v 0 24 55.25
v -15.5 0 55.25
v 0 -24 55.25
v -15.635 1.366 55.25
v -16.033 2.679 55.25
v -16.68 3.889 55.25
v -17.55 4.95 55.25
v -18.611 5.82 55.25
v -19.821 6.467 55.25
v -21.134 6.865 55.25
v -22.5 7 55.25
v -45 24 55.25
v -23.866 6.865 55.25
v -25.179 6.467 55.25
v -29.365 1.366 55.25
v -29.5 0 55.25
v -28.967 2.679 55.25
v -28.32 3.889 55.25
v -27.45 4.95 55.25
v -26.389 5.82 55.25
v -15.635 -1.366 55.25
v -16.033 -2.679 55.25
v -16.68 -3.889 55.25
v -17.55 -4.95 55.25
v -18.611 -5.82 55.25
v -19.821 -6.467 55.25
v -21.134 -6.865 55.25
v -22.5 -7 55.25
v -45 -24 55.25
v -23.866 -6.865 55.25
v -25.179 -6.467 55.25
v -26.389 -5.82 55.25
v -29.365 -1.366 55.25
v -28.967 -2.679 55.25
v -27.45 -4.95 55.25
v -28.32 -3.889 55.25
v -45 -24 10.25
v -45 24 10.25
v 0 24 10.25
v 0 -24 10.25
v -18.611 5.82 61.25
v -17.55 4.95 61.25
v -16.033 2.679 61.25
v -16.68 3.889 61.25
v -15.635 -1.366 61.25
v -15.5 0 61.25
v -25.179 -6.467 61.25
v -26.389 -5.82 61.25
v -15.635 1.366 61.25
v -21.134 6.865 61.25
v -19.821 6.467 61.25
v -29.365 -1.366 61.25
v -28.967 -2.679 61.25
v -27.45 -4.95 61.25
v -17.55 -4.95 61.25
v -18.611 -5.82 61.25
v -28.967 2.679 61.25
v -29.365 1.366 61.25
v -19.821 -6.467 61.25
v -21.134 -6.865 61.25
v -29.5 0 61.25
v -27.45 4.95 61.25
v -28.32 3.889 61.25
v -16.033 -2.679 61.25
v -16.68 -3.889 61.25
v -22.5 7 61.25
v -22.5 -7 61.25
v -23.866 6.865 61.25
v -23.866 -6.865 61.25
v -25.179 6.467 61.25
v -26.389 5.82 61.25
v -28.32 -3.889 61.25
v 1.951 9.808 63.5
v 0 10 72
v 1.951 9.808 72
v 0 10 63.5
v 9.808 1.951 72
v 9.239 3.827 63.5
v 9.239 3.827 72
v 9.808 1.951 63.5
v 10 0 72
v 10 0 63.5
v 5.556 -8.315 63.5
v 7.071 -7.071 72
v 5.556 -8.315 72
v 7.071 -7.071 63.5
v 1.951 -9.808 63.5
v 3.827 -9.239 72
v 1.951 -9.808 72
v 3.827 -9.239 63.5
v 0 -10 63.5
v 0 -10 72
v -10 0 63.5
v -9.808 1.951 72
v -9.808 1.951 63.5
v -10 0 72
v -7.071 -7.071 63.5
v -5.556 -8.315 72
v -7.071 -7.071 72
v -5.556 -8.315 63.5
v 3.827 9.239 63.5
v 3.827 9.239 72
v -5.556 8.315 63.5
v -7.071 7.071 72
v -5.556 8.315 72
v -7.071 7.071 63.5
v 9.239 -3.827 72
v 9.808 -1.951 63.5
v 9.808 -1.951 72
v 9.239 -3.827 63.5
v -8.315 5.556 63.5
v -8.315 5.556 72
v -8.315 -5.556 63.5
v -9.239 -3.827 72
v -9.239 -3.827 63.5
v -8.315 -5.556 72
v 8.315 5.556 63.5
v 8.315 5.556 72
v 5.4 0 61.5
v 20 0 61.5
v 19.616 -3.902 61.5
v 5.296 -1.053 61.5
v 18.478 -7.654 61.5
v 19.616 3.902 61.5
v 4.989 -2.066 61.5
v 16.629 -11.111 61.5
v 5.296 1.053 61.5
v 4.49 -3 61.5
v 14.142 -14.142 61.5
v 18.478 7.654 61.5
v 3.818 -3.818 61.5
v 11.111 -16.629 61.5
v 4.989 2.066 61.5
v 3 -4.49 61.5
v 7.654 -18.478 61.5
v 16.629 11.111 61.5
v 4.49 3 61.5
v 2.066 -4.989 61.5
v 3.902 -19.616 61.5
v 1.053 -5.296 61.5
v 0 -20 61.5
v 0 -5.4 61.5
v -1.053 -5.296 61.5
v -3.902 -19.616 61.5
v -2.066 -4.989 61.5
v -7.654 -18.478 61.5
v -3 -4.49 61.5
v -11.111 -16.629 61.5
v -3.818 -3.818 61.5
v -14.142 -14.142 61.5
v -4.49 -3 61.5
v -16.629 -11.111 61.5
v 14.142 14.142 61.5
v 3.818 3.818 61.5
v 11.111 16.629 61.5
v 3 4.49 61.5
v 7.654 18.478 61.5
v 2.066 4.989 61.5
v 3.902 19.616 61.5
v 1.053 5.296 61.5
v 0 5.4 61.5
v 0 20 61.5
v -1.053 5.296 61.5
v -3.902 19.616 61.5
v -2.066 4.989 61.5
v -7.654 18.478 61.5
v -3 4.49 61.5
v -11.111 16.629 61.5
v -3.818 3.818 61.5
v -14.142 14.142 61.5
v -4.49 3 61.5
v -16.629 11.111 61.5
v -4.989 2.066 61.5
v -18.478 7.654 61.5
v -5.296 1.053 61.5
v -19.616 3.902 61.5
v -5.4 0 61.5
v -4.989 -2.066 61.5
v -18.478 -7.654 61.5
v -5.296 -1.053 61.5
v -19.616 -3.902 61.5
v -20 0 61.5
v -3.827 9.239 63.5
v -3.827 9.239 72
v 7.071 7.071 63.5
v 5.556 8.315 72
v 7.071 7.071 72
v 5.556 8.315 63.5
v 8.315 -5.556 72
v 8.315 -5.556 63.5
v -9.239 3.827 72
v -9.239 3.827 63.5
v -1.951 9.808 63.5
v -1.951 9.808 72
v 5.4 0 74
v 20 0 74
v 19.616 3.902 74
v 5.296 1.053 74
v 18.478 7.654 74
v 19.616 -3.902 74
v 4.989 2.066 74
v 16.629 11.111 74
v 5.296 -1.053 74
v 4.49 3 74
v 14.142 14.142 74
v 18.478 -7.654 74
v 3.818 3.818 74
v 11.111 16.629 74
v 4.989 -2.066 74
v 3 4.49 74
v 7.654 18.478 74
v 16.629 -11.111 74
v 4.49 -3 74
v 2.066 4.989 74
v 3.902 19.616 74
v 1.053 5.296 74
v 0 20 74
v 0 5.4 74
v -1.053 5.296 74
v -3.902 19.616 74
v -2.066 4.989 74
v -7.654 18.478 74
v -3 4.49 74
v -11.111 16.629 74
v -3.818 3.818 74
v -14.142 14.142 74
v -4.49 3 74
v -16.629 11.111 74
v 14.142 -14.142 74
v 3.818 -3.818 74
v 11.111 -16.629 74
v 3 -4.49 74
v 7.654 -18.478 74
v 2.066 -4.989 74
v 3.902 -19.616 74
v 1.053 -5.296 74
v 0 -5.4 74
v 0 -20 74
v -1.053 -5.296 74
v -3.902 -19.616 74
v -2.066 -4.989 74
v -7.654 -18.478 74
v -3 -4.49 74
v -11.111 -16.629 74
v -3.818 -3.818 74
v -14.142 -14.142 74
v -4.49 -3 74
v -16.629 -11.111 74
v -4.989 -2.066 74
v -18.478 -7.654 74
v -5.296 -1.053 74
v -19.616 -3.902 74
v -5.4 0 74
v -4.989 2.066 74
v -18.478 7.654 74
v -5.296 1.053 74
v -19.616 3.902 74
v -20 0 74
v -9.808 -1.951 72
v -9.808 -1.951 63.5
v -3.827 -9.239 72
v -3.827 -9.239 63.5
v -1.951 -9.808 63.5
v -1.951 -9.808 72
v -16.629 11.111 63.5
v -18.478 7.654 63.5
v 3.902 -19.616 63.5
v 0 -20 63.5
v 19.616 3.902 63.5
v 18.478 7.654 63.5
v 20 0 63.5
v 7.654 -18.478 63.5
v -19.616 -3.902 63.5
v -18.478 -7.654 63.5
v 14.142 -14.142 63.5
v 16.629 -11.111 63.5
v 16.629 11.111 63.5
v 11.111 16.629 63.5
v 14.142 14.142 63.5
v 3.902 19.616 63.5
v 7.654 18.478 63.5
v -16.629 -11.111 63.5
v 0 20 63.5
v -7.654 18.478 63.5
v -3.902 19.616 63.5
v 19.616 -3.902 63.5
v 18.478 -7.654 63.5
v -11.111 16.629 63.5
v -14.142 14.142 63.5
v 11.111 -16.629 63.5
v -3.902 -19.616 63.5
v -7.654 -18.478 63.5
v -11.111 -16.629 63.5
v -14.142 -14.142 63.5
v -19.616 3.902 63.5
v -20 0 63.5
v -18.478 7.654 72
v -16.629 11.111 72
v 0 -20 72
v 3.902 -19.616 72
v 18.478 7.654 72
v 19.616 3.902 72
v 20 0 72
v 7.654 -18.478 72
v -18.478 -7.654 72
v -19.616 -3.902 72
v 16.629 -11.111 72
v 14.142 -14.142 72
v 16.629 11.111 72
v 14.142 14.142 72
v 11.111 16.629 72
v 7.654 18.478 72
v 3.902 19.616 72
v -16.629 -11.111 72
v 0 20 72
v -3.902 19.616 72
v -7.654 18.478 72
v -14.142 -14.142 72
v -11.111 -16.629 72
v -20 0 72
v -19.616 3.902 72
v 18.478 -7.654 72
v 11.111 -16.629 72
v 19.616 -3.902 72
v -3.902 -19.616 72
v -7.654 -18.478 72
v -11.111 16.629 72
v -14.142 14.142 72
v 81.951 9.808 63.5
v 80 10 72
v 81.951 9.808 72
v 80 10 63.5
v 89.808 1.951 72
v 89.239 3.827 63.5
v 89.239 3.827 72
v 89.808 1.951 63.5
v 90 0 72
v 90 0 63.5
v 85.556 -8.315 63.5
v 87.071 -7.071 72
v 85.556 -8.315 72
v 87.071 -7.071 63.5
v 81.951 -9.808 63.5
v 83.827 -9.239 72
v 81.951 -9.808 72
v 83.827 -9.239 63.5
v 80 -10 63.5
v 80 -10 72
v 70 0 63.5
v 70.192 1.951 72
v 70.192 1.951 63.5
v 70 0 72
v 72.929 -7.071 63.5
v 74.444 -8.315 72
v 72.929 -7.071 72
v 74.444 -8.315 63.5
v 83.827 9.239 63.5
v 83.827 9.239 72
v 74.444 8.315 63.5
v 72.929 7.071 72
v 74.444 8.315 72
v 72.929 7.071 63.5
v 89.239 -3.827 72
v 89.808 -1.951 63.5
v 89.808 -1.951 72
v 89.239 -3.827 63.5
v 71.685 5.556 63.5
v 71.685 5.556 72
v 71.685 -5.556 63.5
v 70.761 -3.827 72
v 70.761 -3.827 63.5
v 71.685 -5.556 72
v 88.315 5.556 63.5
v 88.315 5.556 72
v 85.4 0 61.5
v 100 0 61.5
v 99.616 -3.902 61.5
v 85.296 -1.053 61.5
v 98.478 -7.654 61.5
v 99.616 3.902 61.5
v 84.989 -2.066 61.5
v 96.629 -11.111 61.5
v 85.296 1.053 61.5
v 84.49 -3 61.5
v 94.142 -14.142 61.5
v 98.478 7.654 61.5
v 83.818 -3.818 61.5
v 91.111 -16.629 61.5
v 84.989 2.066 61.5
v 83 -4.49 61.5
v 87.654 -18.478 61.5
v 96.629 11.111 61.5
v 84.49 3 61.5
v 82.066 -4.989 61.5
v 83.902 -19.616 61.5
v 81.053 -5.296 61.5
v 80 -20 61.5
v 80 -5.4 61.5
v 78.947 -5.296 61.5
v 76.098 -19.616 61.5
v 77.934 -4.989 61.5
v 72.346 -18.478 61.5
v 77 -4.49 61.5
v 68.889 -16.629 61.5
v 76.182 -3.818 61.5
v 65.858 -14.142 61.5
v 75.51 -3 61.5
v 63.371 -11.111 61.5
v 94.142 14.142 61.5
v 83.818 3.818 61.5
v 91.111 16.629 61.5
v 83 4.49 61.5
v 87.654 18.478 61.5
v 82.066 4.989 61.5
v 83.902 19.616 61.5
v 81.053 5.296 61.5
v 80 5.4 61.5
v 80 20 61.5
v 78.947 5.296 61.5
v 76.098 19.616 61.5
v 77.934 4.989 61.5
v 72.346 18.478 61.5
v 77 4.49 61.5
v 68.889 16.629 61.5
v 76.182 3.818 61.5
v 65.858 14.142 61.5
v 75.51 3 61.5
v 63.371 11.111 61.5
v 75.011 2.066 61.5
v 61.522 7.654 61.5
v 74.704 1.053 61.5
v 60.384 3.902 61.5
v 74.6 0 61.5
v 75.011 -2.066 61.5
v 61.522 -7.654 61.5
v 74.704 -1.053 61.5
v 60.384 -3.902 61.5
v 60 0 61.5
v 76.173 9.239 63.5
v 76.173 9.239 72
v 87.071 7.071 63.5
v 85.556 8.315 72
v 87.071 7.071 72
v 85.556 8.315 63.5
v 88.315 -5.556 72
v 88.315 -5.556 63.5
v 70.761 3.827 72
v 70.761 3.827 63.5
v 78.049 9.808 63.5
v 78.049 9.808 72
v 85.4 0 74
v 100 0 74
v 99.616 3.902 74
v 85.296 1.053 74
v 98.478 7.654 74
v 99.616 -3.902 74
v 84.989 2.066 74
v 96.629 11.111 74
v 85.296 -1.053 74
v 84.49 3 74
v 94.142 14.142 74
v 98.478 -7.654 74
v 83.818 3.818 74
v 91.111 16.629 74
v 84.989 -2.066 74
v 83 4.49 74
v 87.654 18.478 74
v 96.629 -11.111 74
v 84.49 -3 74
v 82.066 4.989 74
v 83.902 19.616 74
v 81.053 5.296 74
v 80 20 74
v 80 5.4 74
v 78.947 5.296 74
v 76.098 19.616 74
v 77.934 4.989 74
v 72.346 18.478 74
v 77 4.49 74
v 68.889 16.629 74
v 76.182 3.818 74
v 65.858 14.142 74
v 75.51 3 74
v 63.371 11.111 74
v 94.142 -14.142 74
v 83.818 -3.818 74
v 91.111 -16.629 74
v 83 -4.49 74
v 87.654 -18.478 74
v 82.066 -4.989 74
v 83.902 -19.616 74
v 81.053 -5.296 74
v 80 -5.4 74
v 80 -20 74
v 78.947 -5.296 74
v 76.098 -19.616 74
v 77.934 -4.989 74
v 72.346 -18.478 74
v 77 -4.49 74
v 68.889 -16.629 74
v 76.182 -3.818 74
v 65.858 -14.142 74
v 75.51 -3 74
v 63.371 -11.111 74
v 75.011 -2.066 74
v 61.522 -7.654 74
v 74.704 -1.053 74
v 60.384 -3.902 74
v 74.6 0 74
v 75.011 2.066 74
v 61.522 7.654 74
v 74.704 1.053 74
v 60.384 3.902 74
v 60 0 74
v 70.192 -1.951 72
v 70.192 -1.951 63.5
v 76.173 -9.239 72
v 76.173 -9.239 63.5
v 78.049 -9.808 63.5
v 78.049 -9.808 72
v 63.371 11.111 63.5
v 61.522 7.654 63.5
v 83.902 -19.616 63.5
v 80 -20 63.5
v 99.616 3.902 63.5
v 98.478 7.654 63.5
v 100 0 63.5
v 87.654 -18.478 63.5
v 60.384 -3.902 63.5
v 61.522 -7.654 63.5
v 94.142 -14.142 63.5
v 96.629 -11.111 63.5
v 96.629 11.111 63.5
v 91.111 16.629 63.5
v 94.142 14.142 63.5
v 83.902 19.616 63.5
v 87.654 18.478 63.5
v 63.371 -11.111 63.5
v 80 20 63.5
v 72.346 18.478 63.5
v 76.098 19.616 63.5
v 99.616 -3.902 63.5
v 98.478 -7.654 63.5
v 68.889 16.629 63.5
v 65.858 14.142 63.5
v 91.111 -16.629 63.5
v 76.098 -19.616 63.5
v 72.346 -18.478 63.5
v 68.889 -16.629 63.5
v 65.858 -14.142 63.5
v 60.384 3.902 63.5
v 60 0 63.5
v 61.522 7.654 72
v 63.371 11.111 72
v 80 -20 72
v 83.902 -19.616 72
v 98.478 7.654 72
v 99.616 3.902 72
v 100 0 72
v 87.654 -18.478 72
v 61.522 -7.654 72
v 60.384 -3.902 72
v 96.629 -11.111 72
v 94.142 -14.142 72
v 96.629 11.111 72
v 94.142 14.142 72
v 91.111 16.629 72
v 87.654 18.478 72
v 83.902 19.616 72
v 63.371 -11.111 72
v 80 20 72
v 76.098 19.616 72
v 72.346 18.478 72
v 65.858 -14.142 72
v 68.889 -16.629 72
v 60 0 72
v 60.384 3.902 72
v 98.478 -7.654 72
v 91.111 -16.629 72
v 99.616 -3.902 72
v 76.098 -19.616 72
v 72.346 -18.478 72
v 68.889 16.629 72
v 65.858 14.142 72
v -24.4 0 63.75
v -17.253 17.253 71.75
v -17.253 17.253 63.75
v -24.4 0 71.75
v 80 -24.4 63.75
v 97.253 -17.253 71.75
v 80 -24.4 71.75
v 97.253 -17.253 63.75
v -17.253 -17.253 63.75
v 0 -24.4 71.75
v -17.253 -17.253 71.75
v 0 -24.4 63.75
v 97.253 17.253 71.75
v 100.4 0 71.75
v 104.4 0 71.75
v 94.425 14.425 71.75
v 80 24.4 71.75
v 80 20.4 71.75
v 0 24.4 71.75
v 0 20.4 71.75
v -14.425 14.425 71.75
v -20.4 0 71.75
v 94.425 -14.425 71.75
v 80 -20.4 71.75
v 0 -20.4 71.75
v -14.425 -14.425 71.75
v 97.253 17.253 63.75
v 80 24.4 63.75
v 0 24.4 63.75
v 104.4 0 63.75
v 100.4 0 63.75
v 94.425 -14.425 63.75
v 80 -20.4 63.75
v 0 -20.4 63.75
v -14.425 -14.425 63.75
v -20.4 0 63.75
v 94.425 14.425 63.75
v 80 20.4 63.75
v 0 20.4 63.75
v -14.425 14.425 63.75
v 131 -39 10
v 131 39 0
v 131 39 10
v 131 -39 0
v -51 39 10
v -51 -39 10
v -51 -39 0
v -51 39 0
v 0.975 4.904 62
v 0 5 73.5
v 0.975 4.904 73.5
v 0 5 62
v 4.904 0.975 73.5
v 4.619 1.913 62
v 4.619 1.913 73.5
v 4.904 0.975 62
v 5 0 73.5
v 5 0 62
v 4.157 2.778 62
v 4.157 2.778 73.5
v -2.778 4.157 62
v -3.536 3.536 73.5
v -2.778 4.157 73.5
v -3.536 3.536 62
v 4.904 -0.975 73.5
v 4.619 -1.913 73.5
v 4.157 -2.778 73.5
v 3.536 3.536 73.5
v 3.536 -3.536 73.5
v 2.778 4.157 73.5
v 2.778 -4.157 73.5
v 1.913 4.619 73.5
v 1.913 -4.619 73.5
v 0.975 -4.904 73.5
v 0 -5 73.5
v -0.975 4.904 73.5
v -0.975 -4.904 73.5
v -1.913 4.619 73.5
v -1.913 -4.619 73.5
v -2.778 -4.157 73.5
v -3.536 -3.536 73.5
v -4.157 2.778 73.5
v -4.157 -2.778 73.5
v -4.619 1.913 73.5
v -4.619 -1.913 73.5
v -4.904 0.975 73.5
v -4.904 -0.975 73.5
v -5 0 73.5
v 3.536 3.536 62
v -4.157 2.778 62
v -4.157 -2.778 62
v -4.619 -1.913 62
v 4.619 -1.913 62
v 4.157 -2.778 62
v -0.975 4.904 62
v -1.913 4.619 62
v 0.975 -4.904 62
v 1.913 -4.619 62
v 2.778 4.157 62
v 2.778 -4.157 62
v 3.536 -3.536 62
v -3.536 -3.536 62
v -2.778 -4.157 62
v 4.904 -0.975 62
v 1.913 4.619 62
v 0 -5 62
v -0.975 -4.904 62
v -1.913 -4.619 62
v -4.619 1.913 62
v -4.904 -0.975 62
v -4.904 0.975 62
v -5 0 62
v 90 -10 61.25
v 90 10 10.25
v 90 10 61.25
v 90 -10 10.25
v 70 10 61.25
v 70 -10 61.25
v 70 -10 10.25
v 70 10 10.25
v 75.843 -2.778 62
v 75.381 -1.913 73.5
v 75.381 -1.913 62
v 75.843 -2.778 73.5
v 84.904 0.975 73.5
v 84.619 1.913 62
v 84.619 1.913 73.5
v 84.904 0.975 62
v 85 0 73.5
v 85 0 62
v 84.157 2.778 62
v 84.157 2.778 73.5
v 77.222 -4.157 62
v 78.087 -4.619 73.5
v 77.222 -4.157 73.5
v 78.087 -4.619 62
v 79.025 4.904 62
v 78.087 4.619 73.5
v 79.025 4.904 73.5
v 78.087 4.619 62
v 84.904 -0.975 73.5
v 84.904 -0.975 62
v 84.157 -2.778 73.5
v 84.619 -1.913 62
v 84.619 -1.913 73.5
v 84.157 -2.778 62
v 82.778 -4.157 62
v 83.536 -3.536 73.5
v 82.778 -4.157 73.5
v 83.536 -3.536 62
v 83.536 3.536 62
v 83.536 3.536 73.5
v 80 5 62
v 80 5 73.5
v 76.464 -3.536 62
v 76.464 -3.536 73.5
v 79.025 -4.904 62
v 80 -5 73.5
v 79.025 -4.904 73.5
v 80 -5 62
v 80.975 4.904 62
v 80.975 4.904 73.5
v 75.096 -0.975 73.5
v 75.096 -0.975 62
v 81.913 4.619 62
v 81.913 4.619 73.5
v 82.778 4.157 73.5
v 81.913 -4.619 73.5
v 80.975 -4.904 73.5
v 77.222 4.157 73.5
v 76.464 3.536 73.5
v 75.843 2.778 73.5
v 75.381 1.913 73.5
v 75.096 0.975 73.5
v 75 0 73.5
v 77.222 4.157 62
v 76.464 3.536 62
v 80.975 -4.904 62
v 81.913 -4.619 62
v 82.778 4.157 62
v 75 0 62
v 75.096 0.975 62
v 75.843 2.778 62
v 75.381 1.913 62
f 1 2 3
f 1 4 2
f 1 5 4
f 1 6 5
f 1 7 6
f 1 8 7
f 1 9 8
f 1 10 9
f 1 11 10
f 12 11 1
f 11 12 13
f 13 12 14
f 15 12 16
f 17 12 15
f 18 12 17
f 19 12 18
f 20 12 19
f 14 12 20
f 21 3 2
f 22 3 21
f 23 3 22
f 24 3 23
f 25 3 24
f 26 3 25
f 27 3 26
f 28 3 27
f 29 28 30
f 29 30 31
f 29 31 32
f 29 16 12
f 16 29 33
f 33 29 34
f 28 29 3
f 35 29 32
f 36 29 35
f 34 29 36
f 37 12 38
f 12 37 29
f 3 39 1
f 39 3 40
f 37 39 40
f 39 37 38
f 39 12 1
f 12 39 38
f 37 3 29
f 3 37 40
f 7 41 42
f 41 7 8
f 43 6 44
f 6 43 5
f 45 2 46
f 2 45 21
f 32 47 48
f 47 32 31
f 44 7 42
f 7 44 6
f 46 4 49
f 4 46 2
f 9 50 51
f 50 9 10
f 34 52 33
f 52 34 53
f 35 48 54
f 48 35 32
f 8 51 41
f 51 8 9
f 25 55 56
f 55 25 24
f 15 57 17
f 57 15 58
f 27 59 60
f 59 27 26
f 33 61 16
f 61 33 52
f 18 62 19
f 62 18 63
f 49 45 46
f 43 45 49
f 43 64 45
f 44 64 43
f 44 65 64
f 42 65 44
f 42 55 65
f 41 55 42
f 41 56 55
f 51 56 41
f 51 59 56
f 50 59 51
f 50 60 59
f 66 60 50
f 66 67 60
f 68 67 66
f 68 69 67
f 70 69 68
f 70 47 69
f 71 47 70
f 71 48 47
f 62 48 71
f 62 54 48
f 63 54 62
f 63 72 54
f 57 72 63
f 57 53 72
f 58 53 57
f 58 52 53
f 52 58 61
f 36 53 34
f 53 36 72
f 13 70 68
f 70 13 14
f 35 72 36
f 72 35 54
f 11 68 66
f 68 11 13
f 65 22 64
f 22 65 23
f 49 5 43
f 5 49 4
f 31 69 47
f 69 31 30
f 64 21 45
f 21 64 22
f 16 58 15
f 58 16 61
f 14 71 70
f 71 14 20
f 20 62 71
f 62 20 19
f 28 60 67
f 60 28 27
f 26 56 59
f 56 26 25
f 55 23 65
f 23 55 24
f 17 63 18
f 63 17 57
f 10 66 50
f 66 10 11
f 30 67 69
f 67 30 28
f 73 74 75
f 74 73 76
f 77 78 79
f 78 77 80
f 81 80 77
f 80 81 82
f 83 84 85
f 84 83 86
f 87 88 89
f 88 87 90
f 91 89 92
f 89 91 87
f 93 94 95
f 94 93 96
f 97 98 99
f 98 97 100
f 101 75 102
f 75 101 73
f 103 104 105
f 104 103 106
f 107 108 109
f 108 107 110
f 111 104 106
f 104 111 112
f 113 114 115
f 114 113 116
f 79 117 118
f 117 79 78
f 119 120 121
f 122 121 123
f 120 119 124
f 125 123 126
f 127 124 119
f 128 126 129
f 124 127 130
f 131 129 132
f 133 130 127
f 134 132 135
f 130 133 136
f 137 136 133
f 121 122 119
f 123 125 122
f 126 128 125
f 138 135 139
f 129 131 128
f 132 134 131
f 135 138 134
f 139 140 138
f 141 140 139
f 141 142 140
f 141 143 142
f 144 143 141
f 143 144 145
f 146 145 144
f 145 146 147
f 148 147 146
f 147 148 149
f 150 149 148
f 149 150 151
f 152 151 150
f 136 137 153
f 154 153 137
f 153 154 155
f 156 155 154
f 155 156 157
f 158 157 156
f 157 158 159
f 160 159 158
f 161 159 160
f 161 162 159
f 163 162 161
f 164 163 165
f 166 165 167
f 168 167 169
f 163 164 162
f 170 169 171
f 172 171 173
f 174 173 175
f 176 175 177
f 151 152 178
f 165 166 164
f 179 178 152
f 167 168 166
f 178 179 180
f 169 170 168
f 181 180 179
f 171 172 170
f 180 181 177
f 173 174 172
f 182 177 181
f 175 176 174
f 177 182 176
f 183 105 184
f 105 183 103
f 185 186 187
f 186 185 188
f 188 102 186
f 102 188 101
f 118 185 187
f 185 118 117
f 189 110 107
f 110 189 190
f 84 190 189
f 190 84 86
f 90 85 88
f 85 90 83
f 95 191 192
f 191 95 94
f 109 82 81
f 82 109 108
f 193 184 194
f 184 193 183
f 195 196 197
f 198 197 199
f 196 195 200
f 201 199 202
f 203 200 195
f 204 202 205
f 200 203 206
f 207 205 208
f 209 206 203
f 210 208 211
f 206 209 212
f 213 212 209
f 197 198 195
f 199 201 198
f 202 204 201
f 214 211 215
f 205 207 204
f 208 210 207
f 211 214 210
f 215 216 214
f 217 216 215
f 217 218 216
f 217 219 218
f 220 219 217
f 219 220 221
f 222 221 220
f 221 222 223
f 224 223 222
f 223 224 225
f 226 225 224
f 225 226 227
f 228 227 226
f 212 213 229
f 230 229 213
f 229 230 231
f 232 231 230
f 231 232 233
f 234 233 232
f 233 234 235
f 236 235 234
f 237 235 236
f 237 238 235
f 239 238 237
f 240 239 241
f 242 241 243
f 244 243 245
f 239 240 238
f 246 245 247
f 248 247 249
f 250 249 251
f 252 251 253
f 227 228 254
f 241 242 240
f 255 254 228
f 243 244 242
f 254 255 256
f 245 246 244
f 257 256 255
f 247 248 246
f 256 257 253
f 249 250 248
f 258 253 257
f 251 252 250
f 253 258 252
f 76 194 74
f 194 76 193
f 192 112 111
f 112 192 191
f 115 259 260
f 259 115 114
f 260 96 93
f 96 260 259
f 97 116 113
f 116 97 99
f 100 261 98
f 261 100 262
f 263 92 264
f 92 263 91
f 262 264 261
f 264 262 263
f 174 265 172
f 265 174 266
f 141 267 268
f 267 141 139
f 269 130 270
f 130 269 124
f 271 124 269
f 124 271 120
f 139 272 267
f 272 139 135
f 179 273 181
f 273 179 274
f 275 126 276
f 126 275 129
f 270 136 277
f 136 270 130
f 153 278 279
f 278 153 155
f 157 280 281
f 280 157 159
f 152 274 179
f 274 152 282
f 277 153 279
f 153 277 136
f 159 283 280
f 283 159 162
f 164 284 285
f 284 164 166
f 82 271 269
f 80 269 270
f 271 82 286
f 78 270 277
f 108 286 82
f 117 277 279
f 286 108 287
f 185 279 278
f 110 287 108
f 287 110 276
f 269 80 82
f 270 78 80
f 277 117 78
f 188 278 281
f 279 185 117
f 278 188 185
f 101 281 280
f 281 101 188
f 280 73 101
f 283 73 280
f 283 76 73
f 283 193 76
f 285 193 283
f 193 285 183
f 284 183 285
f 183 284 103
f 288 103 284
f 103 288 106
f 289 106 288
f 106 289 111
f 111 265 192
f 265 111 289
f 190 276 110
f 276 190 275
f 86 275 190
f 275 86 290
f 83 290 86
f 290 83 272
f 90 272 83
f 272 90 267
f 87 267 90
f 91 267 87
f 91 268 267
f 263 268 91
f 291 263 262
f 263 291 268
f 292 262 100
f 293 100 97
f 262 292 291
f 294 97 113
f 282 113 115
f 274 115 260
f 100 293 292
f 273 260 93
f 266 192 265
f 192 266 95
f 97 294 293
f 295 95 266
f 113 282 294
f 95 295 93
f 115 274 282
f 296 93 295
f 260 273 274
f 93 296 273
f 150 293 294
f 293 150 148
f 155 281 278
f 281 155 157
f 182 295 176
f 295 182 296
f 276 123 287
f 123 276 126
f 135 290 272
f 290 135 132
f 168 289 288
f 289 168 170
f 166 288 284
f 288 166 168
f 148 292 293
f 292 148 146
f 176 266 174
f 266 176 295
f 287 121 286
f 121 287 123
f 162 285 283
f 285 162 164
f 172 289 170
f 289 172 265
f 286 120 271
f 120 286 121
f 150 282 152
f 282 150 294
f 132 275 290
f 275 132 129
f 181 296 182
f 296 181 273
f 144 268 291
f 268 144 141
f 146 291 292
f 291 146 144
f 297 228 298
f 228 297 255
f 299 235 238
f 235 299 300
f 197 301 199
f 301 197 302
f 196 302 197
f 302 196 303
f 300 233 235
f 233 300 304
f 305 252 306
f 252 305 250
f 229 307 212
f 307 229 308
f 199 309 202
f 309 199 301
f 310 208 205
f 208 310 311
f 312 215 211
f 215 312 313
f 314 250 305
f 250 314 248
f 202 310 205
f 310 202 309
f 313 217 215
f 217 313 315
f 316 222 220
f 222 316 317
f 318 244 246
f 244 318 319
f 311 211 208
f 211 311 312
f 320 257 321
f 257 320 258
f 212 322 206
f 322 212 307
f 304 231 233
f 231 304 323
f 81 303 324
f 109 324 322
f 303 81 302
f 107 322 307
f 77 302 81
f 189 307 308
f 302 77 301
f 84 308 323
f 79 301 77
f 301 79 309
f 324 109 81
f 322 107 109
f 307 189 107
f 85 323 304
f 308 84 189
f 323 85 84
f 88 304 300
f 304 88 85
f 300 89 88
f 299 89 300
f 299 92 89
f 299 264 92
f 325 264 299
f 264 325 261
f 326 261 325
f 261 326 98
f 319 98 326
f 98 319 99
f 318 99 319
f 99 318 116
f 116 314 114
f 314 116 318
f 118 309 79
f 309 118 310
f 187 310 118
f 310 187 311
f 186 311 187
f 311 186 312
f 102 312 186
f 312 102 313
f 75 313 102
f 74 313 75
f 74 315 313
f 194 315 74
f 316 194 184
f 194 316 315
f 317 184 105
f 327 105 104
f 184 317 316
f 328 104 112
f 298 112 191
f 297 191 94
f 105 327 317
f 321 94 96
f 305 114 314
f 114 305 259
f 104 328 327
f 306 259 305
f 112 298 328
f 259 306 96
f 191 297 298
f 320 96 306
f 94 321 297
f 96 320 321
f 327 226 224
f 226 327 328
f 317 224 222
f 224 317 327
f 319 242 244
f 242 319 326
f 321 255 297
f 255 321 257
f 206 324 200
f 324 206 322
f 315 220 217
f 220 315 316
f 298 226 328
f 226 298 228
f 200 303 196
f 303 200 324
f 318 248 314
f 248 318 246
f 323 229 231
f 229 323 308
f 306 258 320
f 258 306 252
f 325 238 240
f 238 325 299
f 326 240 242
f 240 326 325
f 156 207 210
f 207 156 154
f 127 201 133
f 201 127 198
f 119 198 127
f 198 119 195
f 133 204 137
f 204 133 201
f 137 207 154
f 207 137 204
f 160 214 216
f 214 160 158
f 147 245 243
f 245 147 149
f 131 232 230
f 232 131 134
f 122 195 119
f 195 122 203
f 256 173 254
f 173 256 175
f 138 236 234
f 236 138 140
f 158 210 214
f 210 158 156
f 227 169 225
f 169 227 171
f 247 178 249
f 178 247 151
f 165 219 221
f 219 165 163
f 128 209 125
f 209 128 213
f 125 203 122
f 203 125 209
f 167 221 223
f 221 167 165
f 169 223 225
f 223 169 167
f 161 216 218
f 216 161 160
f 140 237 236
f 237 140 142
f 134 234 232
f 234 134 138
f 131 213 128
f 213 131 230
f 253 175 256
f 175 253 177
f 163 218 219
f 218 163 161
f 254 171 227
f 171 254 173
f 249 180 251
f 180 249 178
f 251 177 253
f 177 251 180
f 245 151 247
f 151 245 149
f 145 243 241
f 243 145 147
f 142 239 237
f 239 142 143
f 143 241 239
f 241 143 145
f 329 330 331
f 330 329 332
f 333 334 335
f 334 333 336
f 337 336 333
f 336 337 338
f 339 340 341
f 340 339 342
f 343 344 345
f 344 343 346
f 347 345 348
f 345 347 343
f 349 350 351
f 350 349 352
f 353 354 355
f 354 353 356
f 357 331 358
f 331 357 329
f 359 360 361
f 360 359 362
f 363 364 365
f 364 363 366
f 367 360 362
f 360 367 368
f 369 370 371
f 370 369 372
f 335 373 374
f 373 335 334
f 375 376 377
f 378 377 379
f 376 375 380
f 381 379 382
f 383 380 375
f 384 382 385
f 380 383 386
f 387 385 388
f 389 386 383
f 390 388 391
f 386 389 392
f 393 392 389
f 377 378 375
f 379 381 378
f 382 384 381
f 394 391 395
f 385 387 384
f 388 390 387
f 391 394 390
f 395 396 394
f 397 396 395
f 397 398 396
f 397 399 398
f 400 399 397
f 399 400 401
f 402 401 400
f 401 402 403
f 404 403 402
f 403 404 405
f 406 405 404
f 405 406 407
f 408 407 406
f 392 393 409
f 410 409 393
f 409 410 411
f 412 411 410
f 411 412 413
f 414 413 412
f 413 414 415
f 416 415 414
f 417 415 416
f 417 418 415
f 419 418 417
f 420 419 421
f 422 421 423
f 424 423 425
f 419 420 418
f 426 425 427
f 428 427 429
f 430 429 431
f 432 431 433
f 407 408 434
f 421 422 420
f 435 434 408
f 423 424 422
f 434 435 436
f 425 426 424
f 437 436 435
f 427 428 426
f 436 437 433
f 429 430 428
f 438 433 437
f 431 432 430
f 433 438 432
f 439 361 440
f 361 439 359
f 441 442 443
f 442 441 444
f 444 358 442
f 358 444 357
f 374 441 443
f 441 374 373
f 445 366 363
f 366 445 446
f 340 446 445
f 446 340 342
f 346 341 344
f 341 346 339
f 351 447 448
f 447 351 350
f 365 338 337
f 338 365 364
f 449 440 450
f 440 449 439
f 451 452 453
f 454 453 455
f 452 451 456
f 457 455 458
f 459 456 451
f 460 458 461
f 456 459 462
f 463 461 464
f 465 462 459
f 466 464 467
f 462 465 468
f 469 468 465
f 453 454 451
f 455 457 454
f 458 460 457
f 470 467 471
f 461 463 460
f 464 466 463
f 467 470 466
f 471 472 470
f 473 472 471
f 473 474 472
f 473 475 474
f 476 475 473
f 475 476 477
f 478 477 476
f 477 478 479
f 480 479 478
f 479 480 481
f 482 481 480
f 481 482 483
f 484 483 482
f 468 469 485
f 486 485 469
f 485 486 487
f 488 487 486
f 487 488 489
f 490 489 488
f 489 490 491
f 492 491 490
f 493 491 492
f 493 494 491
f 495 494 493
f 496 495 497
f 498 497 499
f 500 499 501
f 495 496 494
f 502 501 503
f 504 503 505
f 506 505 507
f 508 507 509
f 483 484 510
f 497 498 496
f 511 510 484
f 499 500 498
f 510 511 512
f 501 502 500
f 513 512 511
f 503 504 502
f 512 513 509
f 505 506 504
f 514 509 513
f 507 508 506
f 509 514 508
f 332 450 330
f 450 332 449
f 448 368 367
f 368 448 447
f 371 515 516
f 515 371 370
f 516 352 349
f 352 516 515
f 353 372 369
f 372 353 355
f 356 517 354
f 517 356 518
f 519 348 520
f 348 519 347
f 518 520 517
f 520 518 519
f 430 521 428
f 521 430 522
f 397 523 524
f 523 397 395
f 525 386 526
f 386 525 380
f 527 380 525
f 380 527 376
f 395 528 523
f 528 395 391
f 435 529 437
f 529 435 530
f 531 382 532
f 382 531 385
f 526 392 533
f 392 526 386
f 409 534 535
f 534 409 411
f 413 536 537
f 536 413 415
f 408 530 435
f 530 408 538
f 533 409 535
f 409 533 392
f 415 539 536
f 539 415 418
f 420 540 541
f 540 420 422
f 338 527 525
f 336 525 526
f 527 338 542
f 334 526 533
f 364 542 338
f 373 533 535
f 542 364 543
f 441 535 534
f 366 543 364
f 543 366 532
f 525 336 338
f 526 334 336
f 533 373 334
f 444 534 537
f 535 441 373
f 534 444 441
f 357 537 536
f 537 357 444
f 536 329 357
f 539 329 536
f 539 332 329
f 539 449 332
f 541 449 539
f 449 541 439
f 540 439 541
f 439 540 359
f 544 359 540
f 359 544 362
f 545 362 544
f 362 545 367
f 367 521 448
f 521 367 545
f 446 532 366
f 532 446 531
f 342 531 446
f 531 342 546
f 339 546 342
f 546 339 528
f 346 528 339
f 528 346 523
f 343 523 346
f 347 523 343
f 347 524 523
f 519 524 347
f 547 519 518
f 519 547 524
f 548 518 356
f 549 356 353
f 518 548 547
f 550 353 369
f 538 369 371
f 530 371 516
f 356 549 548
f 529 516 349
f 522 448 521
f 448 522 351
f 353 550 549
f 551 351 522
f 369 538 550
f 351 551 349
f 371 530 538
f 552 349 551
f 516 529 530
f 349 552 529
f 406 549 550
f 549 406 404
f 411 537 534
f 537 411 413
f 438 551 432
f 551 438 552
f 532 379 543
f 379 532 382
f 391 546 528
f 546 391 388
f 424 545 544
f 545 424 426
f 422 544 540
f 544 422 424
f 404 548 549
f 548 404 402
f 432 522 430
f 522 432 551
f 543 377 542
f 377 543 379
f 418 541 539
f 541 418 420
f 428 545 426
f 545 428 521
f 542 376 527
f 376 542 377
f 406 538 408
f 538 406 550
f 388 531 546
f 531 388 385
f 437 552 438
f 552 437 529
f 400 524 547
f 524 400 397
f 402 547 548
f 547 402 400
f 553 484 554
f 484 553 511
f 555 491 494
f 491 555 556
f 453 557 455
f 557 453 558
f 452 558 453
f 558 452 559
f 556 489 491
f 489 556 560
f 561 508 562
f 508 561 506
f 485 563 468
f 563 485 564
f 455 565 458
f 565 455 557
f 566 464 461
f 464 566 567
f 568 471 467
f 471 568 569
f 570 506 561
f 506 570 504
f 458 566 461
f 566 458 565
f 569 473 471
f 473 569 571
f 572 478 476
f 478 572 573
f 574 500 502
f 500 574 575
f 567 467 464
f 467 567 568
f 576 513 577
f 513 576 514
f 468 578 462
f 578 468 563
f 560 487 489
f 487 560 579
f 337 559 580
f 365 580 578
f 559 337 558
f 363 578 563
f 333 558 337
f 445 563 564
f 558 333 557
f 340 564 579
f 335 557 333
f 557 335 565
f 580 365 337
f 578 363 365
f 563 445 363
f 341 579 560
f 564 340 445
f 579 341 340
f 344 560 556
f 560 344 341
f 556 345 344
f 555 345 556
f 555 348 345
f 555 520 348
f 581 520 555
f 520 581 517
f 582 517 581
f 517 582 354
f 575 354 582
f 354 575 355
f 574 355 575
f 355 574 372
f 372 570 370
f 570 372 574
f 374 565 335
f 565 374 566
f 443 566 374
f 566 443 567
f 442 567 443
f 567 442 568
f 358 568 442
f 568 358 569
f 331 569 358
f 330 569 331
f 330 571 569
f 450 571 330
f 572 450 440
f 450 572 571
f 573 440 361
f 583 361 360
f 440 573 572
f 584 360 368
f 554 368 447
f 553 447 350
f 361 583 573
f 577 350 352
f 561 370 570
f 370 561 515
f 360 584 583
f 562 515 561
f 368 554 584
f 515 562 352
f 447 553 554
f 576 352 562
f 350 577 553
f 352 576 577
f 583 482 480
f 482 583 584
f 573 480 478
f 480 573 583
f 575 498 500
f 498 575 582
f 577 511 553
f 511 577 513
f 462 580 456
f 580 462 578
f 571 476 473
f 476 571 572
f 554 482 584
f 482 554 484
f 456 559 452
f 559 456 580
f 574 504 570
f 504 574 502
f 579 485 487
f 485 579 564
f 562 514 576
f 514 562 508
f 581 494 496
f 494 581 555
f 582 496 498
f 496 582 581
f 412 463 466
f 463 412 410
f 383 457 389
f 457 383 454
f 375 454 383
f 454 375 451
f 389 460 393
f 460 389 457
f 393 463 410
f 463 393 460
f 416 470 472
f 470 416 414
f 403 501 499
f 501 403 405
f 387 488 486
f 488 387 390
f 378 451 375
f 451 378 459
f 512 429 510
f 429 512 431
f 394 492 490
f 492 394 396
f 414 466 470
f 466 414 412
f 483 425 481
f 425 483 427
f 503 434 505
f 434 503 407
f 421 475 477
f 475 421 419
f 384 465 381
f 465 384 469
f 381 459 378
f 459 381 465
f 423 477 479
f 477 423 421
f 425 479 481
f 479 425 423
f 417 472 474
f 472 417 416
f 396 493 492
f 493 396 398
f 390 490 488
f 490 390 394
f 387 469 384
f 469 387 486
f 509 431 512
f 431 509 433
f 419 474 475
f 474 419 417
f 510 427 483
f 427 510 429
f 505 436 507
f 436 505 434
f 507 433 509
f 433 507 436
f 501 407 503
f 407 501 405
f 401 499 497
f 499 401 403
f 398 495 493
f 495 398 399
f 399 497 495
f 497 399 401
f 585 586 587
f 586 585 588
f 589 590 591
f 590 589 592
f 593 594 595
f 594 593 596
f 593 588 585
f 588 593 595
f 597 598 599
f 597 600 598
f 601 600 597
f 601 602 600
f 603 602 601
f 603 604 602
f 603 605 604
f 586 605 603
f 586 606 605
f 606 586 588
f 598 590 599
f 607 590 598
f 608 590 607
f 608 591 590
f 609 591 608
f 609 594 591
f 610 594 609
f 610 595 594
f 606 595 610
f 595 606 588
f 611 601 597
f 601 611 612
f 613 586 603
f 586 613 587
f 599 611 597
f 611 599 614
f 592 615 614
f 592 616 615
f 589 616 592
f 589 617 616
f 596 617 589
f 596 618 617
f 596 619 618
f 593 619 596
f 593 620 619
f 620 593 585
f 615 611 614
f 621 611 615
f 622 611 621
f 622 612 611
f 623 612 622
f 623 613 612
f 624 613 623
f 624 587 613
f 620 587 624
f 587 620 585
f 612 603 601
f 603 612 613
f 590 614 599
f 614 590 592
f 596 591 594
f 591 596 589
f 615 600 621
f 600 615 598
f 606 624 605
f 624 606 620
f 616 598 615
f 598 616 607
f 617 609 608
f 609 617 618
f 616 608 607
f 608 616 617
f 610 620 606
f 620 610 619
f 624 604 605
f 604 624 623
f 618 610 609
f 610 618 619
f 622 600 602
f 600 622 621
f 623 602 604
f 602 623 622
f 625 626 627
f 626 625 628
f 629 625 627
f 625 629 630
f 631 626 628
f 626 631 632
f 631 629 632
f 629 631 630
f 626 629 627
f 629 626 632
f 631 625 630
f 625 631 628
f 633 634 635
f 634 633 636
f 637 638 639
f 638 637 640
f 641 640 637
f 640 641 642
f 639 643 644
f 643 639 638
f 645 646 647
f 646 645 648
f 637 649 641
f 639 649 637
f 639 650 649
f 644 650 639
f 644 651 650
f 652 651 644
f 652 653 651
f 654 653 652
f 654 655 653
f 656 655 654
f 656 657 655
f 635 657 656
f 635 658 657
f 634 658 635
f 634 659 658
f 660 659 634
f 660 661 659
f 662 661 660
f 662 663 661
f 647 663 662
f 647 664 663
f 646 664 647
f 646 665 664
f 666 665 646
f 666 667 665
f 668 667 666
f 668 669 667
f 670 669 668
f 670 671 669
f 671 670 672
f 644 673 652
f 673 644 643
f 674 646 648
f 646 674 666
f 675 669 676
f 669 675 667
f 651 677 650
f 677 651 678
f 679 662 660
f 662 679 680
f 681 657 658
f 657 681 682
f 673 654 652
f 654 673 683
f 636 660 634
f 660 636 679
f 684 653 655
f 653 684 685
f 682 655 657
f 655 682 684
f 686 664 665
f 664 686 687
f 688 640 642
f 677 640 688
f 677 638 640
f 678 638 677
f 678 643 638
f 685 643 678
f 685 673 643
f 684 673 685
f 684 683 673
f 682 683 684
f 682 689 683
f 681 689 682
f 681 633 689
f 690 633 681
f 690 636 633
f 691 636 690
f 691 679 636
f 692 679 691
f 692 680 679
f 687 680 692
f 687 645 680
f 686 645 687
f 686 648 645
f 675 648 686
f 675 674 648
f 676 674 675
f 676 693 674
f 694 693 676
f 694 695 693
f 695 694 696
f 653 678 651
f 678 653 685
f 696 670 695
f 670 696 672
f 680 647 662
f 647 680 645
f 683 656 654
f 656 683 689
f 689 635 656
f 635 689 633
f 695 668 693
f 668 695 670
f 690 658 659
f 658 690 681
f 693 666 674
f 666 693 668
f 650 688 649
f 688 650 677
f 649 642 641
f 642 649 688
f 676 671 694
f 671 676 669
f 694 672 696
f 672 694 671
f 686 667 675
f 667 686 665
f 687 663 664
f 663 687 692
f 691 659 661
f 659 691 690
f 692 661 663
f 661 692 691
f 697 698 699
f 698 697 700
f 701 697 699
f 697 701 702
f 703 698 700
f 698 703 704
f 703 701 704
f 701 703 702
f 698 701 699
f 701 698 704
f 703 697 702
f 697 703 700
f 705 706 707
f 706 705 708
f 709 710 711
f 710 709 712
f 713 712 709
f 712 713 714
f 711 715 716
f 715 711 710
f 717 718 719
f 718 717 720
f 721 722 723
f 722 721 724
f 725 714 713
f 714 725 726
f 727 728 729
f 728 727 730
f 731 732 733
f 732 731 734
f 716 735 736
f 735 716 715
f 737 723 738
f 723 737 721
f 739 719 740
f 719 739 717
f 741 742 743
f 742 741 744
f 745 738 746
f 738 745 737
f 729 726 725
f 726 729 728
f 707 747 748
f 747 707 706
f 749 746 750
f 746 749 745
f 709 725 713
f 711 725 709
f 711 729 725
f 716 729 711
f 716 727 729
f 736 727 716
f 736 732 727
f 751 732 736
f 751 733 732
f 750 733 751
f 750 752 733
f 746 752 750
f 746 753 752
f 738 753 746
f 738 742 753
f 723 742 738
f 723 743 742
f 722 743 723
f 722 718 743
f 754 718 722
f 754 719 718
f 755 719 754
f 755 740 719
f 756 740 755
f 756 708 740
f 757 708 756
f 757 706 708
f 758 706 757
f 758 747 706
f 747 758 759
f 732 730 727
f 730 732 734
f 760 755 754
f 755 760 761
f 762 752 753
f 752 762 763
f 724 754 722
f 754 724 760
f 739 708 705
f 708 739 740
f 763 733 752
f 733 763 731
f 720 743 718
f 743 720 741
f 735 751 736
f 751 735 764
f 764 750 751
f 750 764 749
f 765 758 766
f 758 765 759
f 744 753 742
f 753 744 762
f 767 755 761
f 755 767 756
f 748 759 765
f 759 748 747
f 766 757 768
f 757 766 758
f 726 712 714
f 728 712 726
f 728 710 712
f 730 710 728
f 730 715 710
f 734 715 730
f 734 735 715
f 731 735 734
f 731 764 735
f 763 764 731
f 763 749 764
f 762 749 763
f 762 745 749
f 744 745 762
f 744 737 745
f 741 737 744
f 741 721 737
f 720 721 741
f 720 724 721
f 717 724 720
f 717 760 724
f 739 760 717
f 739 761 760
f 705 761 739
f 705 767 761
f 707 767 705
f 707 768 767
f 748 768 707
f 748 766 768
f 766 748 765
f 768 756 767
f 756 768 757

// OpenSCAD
$fn = 32;

// ------------------------------------------------------------------------
// Motor belt drive: span 80 mm, pulleys d40, belt 8 mm wide
// Every part is its own module, assembly() places every instance.
// ------------------------------------------------------------------------

// --- part 1 ---
module base_plate() {
  difference() {
    translate([-91, -39, 0]) cube([182, 78, 10]);
  }
}

// --- part 2 ---
module motor() {
  union() {
    translate([-22.5, -24, 0]) cube([45, 48, 45]);
    translate([25.5, 0, 22.5]) rotate([0, 90, 0]) cylinder(h = 6, d = 14, center = true);
  }
}

// --- part 3 ---
module drive_shaft() {
  translate([0, 0, -5.75]) cylinder(h = 11.5, d = 10);
}

// --- part 4 ---
module pulley_drive() {
  difference() {
    union() {
      cylinder(h = 12.5, d = 20);
      cylinder(h = 2, d = 40);
      translate([0, 0, 10.5]) cylinder(h = 2, d = 40);
    }
    translate([0, 0, -1]) cylinder(h = 14.5, d = 10.8);
  }
}

// --- part 5 ---
module idler_post() {
  translate([-10, -10, 0]) cube([20, 20, 51]);
}

// --- part 6 ---
module driven_shaft() {
  translate([0, 0, -5.75]) cylinder(h = 11.5, d = 10);
}

// --- part 7 ---
module pulley_driven() {
  difference() {
    union() {
      cylinder(h = 12.5, d = 20);
      cylinder(h = 2, d = 40);
      translate([0, 0, 10.5]) cylinder(h = 2, d = 40);
    }
    translate([0, 0, -1]) cylinder(h = 14.5, d = 10.8);
  }
}

// --- part 8 ---
module drive_belt() {
  difference() {
    linear_extrude(height = 8) polygon(points = concat([for (a = [90 : 45 : 270]) [24.4 * cos(a), 24.4 * sin(a)]], [for (a = [270 : 45 : 450]) [80 + 24.4 * cos(a), 24.4 * sin(a)]]));
    translate([0, 0, -1]) linear_extrude(height = 10) polygon(points = concat([for (a = [90 : 45 : 270]) [20.4 * cos(a), 20.4 * sin(a)]], [for (a = [270 : 45 : 450]) [80 + 20.4 * cos(a), 20.4 * sin(a)]]));
  }
}

// --- assembly ---
module assembly() {
  color([0.80, 0.24, 0.20]) translate([40, 0, 0]) rotate([0, 0, 0]) base_plate();
  color([0.20, 0.45, 0.75]) translate([0, 0, 32.75]) rotate([0, 270, 0]) motor();
  color([0.25, 0.62, 0.32]) translate([0, 0, 67.75]) rotate([0, 0, 0]) drive_shaft();
  color([0.92, 0.70, 0.18]) translate([0, 0, 61.5]) rotate([0, 0, 0]) pulley_drive();
  color([0.58, 0.35, 0.70]) translate([80, 0, 10.25]) rotate([0, 0, 0]) idler_post();
  color([0.16, 0.66, 0.66]) translate([80, 0, 67.75]) rotate([0, 0, 0]) driven_shaft();
  color([0.85, 0.48, 0.18]) translate([80, 0, 61.5]) rotate([0, 0, 0]) pulley_driven();
  color([0.55, 0.60, 0.65]) translate([0, 0, 63.75]) rotate([0, 0, 0]) drive_belt();
}

assembly();
